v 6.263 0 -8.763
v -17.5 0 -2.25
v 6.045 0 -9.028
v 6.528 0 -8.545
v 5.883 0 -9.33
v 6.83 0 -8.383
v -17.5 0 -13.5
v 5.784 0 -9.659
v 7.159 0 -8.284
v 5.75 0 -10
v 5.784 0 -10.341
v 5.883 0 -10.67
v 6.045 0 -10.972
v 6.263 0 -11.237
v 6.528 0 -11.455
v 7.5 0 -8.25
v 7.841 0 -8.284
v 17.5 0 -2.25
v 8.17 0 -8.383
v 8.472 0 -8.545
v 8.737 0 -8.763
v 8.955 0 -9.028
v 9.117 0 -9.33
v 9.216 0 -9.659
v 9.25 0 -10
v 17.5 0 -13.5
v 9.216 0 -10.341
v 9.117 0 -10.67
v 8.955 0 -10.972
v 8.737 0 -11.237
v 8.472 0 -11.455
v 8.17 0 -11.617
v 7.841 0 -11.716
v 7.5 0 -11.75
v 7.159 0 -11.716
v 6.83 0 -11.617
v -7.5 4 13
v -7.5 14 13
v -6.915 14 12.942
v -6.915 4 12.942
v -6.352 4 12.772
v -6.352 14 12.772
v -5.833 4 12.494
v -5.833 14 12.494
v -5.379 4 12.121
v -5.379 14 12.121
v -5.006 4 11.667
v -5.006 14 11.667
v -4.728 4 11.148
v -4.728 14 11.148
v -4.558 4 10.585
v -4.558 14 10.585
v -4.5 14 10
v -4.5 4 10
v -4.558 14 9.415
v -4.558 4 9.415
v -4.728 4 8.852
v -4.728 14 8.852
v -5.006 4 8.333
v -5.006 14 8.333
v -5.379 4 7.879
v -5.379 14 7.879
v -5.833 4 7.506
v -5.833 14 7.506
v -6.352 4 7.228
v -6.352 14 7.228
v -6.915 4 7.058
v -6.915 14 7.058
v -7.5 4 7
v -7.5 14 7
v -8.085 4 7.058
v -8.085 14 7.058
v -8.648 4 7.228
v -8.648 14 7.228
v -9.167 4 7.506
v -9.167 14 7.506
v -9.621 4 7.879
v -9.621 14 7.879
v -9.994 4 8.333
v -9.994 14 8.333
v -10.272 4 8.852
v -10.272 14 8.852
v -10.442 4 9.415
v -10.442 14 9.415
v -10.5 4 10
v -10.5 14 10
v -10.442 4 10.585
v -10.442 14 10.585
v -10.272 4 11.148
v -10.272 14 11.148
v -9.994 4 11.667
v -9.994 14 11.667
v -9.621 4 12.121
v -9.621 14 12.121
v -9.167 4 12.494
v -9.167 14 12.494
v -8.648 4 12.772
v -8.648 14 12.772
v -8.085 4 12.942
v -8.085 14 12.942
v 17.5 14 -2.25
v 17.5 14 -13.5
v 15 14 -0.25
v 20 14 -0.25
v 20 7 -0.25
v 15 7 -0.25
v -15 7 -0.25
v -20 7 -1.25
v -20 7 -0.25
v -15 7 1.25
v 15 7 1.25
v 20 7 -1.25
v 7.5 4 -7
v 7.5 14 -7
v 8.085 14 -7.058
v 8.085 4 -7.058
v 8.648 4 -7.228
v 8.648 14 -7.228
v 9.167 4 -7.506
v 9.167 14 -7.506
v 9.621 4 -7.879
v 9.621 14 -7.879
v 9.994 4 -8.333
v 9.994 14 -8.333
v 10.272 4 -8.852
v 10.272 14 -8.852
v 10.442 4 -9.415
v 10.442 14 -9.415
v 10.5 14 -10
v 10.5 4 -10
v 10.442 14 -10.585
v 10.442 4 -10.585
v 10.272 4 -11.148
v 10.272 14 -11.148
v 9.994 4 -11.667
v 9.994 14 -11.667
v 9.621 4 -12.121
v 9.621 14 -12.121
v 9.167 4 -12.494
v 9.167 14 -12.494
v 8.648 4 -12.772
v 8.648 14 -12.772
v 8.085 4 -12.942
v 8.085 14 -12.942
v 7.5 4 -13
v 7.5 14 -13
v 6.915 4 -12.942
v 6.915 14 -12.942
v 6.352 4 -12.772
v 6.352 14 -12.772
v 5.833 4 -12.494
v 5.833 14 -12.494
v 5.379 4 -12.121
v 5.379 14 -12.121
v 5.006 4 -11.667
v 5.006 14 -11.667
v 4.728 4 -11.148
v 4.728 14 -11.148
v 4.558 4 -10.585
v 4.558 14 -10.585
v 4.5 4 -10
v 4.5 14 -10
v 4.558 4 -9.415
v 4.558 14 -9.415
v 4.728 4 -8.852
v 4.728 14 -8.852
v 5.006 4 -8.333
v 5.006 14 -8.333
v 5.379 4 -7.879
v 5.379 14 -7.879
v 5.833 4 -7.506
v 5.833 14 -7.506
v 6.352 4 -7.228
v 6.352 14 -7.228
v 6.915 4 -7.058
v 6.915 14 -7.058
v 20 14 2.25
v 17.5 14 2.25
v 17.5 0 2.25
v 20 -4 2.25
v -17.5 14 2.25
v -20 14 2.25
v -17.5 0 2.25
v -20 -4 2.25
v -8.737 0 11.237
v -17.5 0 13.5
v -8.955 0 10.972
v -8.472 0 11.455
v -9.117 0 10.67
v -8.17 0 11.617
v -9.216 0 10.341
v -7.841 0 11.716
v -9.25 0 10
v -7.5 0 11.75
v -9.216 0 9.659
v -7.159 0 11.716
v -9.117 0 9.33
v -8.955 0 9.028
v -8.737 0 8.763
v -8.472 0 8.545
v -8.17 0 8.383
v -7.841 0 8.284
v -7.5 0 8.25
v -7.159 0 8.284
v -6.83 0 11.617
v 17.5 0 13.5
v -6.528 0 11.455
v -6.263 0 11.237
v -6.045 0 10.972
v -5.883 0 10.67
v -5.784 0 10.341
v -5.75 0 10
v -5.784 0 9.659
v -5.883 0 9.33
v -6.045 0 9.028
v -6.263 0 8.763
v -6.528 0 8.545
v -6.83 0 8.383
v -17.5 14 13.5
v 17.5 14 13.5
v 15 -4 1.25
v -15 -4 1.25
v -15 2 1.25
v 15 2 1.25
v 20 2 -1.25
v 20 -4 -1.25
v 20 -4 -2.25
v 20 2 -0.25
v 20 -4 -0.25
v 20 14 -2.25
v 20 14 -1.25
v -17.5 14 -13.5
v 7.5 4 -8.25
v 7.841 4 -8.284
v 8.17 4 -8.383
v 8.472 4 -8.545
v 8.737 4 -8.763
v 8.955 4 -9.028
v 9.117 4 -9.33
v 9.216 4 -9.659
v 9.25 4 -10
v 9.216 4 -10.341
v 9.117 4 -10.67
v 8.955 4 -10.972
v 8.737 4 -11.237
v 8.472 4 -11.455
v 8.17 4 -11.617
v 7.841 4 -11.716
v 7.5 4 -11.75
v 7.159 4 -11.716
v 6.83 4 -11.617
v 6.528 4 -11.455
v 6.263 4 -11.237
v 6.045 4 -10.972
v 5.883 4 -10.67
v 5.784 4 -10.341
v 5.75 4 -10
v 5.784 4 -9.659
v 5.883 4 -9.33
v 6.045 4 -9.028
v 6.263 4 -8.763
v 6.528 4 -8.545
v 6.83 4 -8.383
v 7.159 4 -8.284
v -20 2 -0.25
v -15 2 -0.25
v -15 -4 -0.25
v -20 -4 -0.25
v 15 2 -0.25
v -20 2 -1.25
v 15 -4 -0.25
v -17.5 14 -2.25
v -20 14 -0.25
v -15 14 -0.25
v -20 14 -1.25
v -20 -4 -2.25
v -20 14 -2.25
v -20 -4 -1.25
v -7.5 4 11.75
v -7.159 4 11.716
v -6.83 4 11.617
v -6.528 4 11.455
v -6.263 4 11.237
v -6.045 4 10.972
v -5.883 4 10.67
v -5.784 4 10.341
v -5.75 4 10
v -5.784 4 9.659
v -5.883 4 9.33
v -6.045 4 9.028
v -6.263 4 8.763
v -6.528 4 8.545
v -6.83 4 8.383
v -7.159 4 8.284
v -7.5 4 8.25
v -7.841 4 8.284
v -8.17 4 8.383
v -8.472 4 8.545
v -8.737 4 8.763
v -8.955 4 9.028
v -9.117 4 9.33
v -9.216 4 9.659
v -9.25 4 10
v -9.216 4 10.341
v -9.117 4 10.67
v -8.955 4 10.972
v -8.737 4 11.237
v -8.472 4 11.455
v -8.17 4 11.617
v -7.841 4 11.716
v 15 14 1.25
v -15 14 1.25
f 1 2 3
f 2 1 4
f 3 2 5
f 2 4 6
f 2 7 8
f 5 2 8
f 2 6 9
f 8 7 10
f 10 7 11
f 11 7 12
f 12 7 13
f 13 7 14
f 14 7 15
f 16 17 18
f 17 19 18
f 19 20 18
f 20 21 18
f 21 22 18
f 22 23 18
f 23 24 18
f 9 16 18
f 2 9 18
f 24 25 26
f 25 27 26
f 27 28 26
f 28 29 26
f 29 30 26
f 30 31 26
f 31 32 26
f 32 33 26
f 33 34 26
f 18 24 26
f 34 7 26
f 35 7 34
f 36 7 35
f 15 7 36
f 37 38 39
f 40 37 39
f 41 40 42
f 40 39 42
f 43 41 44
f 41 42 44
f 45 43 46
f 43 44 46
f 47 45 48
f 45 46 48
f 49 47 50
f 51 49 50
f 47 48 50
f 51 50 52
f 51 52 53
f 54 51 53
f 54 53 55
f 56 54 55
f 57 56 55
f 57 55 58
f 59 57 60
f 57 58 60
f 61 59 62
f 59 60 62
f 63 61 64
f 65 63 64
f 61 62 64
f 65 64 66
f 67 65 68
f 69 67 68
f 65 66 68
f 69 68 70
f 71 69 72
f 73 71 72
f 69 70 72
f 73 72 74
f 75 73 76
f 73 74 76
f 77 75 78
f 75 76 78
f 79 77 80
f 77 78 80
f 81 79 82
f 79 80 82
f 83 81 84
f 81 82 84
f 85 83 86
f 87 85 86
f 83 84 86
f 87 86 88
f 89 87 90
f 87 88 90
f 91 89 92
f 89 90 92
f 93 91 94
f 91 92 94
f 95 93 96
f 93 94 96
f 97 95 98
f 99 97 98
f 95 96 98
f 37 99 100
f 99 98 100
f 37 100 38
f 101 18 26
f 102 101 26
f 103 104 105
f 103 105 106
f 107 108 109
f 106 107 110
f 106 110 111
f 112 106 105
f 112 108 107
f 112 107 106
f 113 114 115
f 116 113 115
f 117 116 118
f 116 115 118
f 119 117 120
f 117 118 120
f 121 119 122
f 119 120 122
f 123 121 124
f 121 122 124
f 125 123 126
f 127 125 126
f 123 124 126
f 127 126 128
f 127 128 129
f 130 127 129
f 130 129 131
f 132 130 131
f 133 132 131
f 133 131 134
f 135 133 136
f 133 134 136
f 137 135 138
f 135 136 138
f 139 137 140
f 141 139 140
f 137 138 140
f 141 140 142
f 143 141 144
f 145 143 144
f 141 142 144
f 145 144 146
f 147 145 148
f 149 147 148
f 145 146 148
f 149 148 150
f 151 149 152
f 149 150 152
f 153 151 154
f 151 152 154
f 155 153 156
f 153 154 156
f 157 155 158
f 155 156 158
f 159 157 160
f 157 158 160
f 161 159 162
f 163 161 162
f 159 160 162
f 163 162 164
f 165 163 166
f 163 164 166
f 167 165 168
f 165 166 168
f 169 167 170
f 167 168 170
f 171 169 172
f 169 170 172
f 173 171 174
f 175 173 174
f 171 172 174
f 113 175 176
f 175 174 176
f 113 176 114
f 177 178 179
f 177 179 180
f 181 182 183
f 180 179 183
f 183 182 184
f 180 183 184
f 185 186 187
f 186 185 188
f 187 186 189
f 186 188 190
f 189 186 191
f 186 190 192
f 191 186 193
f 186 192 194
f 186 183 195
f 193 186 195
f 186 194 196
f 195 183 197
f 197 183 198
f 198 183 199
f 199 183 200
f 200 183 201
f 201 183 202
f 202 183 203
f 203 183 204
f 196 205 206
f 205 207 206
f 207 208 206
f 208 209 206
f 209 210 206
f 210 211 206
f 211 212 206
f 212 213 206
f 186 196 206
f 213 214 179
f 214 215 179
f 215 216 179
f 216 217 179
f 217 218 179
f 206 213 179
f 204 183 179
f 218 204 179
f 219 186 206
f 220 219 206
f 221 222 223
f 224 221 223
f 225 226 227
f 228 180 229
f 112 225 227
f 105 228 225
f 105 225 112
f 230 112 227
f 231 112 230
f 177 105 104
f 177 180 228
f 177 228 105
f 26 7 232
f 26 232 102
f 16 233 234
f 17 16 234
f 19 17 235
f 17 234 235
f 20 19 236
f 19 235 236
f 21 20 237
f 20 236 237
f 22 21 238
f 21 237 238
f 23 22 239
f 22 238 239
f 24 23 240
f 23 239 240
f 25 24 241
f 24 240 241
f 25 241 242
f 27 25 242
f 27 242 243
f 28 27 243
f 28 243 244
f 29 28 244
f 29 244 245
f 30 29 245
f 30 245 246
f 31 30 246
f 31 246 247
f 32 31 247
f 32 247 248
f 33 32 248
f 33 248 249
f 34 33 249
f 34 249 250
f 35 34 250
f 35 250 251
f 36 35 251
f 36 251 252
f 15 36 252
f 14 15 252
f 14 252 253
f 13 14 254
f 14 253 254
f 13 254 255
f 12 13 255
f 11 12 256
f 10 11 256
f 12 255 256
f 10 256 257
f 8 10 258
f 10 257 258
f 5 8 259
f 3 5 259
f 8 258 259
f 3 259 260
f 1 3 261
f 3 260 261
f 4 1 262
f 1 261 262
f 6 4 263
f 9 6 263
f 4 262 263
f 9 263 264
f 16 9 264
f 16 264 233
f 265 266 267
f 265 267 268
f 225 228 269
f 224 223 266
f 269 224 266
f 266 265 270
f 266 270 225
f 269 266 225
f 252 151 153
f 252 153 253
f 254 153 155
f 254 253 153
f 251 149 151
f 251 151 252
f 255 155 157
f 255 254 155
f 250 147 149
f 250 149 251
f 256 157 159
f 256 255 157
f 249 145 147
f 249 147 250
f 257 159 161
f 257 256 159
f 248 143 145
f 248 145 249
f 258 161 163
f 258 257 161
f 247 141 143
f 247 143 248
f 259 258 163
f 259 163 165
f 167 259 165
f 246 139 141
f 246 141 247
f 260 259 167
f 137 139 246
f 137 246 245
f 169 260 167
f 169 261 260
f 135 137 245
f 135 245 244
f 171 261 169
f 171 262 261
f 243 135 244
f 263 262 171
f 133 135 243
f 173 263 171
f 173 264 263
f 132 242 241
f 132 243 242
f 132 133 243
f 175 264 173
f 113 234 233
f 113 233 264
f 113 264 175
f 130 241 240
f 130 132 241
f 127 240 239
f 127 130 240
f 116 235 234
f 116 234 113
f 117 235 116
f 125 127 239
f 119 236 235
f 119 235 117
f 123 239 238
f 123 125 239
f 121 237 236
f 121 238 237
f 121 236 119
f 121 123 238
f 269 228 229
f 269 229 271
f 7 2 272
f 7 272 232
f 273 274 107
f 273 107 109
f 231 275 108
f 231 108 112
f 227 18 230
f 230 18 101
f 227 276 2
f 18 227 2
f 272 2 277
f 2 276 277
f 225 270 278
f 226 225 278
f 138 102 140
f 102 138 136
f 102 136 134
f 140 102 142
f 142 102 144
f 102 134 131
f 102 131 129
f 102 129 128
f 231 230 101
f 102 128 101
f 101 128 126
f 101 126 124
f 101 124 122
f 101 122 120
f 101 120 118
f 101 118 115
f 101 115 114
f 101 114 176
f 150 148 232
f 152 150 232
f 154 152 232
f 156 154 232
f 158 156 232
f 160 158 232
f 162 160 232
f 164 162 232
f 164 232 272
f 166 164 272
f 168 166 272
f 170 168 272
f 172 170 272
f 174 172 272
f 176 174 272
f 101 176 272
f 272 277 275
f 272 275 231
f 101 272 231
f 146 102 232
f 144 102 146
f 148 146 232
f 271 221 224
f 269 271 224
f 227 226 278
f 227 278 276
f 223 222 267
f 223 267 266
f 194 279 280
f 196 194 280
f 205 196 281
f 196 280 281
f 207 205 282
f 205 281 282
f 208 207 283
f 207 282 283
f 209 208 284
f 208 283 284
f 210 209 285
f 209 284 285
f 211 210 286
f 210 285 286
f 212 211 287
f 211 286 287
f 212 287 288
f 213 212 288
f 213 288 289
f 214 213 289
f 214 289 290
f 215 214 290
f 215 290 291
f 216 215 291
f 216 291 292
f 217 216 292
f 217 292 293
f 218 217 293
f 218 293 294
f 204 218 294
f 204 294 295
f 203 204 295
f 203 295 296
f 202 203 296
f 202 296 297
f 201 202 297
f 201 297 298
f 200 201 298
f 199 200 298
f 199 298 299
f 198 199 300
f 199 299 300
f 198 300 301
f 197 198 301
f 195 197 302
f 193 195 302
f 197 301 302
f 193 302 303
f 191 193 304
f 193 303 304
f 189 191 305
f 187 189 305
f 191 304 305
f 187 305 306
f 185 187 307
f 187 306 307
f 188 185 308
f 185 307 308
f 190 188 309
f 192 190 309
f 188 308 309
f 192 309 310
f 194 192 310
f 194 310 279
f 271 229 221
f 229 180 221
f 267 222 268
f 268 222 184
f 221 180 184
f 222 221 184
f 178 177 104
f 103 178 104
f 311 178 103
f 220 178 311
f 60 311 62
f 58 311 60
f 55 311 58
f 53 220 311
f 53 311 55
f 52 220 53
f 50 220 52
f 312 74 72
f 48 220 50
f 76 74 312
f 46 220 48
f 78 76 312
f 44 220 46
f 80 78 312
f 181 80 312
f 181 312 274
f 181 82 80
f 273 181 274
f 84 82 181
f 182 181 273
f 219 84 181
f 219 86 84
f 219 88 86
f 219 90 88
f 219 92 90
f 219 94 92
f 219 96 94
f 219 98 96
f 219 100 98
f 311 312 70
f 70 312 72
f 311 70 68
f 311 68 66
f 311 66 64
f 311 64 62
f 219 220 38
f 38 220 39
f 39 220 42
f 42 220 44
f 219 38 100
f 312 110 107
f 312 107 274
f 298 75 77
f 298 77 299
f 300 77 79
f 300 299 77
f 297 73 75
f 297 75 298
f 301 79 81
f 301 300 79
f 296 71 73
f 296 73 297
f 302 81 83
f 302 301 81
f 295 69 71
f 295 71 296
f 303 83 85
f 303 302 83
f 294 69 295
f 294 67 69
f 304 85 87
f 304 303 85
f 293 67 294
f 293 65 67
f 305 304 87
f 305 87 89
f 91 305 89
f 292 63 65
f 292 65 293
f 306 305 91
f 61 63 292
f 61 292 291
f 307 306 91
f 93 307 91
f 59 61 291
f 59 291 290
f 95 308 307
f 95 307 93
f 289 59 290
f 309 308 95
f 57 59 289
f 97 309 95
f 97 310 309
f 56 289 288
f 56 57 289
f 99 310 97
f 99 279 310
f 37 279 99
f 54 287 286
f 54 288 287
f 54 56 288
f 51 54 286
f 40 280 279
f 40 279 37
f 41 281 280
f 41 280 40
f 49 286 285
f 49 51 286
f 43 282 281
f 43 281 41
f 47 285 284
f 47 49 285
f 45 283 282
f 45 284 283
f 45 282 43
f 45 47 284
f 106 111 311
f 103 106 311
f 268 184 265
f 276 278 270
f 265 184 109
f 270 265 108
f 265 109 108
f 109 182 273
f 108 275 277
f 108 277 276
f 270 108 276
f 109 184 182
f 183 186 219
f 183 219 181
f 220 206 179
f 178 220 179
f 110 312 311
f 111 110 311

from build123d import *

# Parameters (mm, degrees)
SKETCH1_W           = 35
SKETCH1_H           = 27
BOSS_EXTRUDE1_DEPTH = 14
SKETCH2_R           = 1.75
CUT_EXTRUDE1_DEPTH  = 14
SKETCH9_R           = 3
CUT_EXTRUDE7_DEPTH  = 10
SKETCH10_W          = 35
SKETCH10_H          = 4.5
BOSS_EXTRUDE2_DEPTH = 4
SKETCH11_W          = 35
SKETCH11_H          = 2.5
CUT_EXTRUDE8_DEPTH  = 6
BOSS_EXTRUDE3_DEPTH = 2.5
BOSS_EXTRUDE4_DEPTH = 2.5
SKETCH14_W          = 5
SKETCH14_H          = 6
BOSS_EXTRUDE5_DEPTH = 1.5
SKETCH15_W          = 40
SKETCH15_H          = 2.5
CUT_EXTRUDE9_DEPTH  = 7
SKETCH16_W          = 5
SKETCH16_H          = 7
BOSS_EXTRUDE6_DEPTH = 1.5


with BuildPart() as part:
    # Sketch1 → Boss-Extrude1 (new body)
    with BuildSketch(Plane(origin=(0, 0, 0), x_dir=(1, 0, 0), z_dir=(0, 1, 0))):
        Rectangle(SKETCH1_W, SKETCH1_H)
    extrude(amount=BOSS_EXTRUDE1_DEPTH)

    # Sketch2 → Cut-Extrude1 (cut)
    with BuildSketch(Plane(origin=(0, 14, 0), x_dir=(1, 0, 0), z_dir=(0, 1, 0))):
        with Locations(Location((7.5, 10, 0), (0, 0, 270))):
            Circle(SKETCH2_R)
        with Locations(Location((-7.5, -10, 0), (0, 0, 270))):
            Circle(SKETCH2_R)
    extrude(amount=-CUT_EXTRUDE1_DEPTH, mode=Mode.SUBTRACT)

    # Sketch9 → Cut-Extrude7 (cut)
    with BuildSketch(Plane(origin=(0, 14, 0), x_dir=(1, 0, 0), z_dir=(0, 1, 0))):
        with Locations(Location((7.5, 10, 0), (0, 0, 270))):
            Circle(SKETCH9_R)
        with Locations(Location((-7.5, -10, 0), (0, 0, 270))):
            Circle(SKETCH9_R)
    extrude(amount=-CUT_EXTRUDE7_DEPTH, mode=Mode.SUBTRACT)

    # Sketch10 → Boss-Extrude2 (add)
    with BuildSketch(Plane.XZ):
        Rectangle(SKETCH10_W, SKETCH10_H)
    extrude(amount=BOSS_EXTRUDE2_DEPTH)

    # Sketch11 → Cut-Extrude8 (cut)
    with BuildSketch(Plane.XZ.offset(4)):
        Rectangle(SKETCH11_W, SKETCH11_H)
    extrude(amount=-CUT_EXTRUDE8_DEPTH, mode=Mode.SUBTRACT)

    # Sketch12 → Boss-Extrude3 (add)
    with BuildSketch(Plane.ZY.offset(17.5)):
        Polygon((-2.25, -4), (-2.25, 0), (-2.25, 14), (2.25, 14), (2.25, 0), (2.25, -4), (1.25, -4), (1.25, 2), (-1.25, 2), (-1.25, -4), align=None)
    extrude(amount=BOSS_EXTRUDE3_DEPTH)

    # Sketch13 → Boss-Extrude4 (add)
    with BuildSketch(Plane(origin=(17.5, 0, 0), x_dir=(0, 0, -1), z_dir=(1, 0, 0))):
        Polygon((2.25, -4), (2.25, 0), (2.25, 14), (-2.25, 14), (-2.25, 0), (-2.25, -4), (-1.25, -4), (-1.25, 2), (1.25, 2), (1.25, -4), align=None)
    extrude(amount=BOSS_EXTRUDE4_DEPTH)

    # Sketch14 → Boss-Extrude5 (add)
    with BuildSketch(Plane(origin=(0, 0, 1.25), x_dir=(-1, 0, 0), z_dir=(0, 0, -1))):
        with Locations((-17.5, -1)):
            Rectangle(SKETCH14_W, SKETCH14_H)
        with Locations((17.5, -1)):
            Rectangle(SKETCH14_W, SKETCH14_H)
    extrude(amount=BOSS_EXTRUDE5_DEPTH)

    # Sketch15 → Cut-Extrude9 (cut)
    with BuildSketch(Plane(origin=(0, 14, 0), x_dir=(1, 0, 0), z_dir=(0, 1, 0))):
        Rectangle(SKETCH15_W, SKETCH15_H)
    extrude(amount=-CUT_EXTRUDE9_DEPTH, mode=Mode.SUBTRACT)

    # Sketch16 → Boss-Extrude6 (add)
    with BuildSketch(Plane(origin=(0, 0, 1.25), x_dir=(-1, 0, 0), z_dir=(0, 0, -1))):
        with Locations((-17.5, 10.5)):
            Rectangle(SKETCH16_W, SKETCH16_H)
        with Locations((17.5, 10.5)):
            Rectangle(SKETCH16_W, SKETCH16_H)
    extrude(amount=BOSS_EXTRUDE6_DEPTH)


solid = part.part
